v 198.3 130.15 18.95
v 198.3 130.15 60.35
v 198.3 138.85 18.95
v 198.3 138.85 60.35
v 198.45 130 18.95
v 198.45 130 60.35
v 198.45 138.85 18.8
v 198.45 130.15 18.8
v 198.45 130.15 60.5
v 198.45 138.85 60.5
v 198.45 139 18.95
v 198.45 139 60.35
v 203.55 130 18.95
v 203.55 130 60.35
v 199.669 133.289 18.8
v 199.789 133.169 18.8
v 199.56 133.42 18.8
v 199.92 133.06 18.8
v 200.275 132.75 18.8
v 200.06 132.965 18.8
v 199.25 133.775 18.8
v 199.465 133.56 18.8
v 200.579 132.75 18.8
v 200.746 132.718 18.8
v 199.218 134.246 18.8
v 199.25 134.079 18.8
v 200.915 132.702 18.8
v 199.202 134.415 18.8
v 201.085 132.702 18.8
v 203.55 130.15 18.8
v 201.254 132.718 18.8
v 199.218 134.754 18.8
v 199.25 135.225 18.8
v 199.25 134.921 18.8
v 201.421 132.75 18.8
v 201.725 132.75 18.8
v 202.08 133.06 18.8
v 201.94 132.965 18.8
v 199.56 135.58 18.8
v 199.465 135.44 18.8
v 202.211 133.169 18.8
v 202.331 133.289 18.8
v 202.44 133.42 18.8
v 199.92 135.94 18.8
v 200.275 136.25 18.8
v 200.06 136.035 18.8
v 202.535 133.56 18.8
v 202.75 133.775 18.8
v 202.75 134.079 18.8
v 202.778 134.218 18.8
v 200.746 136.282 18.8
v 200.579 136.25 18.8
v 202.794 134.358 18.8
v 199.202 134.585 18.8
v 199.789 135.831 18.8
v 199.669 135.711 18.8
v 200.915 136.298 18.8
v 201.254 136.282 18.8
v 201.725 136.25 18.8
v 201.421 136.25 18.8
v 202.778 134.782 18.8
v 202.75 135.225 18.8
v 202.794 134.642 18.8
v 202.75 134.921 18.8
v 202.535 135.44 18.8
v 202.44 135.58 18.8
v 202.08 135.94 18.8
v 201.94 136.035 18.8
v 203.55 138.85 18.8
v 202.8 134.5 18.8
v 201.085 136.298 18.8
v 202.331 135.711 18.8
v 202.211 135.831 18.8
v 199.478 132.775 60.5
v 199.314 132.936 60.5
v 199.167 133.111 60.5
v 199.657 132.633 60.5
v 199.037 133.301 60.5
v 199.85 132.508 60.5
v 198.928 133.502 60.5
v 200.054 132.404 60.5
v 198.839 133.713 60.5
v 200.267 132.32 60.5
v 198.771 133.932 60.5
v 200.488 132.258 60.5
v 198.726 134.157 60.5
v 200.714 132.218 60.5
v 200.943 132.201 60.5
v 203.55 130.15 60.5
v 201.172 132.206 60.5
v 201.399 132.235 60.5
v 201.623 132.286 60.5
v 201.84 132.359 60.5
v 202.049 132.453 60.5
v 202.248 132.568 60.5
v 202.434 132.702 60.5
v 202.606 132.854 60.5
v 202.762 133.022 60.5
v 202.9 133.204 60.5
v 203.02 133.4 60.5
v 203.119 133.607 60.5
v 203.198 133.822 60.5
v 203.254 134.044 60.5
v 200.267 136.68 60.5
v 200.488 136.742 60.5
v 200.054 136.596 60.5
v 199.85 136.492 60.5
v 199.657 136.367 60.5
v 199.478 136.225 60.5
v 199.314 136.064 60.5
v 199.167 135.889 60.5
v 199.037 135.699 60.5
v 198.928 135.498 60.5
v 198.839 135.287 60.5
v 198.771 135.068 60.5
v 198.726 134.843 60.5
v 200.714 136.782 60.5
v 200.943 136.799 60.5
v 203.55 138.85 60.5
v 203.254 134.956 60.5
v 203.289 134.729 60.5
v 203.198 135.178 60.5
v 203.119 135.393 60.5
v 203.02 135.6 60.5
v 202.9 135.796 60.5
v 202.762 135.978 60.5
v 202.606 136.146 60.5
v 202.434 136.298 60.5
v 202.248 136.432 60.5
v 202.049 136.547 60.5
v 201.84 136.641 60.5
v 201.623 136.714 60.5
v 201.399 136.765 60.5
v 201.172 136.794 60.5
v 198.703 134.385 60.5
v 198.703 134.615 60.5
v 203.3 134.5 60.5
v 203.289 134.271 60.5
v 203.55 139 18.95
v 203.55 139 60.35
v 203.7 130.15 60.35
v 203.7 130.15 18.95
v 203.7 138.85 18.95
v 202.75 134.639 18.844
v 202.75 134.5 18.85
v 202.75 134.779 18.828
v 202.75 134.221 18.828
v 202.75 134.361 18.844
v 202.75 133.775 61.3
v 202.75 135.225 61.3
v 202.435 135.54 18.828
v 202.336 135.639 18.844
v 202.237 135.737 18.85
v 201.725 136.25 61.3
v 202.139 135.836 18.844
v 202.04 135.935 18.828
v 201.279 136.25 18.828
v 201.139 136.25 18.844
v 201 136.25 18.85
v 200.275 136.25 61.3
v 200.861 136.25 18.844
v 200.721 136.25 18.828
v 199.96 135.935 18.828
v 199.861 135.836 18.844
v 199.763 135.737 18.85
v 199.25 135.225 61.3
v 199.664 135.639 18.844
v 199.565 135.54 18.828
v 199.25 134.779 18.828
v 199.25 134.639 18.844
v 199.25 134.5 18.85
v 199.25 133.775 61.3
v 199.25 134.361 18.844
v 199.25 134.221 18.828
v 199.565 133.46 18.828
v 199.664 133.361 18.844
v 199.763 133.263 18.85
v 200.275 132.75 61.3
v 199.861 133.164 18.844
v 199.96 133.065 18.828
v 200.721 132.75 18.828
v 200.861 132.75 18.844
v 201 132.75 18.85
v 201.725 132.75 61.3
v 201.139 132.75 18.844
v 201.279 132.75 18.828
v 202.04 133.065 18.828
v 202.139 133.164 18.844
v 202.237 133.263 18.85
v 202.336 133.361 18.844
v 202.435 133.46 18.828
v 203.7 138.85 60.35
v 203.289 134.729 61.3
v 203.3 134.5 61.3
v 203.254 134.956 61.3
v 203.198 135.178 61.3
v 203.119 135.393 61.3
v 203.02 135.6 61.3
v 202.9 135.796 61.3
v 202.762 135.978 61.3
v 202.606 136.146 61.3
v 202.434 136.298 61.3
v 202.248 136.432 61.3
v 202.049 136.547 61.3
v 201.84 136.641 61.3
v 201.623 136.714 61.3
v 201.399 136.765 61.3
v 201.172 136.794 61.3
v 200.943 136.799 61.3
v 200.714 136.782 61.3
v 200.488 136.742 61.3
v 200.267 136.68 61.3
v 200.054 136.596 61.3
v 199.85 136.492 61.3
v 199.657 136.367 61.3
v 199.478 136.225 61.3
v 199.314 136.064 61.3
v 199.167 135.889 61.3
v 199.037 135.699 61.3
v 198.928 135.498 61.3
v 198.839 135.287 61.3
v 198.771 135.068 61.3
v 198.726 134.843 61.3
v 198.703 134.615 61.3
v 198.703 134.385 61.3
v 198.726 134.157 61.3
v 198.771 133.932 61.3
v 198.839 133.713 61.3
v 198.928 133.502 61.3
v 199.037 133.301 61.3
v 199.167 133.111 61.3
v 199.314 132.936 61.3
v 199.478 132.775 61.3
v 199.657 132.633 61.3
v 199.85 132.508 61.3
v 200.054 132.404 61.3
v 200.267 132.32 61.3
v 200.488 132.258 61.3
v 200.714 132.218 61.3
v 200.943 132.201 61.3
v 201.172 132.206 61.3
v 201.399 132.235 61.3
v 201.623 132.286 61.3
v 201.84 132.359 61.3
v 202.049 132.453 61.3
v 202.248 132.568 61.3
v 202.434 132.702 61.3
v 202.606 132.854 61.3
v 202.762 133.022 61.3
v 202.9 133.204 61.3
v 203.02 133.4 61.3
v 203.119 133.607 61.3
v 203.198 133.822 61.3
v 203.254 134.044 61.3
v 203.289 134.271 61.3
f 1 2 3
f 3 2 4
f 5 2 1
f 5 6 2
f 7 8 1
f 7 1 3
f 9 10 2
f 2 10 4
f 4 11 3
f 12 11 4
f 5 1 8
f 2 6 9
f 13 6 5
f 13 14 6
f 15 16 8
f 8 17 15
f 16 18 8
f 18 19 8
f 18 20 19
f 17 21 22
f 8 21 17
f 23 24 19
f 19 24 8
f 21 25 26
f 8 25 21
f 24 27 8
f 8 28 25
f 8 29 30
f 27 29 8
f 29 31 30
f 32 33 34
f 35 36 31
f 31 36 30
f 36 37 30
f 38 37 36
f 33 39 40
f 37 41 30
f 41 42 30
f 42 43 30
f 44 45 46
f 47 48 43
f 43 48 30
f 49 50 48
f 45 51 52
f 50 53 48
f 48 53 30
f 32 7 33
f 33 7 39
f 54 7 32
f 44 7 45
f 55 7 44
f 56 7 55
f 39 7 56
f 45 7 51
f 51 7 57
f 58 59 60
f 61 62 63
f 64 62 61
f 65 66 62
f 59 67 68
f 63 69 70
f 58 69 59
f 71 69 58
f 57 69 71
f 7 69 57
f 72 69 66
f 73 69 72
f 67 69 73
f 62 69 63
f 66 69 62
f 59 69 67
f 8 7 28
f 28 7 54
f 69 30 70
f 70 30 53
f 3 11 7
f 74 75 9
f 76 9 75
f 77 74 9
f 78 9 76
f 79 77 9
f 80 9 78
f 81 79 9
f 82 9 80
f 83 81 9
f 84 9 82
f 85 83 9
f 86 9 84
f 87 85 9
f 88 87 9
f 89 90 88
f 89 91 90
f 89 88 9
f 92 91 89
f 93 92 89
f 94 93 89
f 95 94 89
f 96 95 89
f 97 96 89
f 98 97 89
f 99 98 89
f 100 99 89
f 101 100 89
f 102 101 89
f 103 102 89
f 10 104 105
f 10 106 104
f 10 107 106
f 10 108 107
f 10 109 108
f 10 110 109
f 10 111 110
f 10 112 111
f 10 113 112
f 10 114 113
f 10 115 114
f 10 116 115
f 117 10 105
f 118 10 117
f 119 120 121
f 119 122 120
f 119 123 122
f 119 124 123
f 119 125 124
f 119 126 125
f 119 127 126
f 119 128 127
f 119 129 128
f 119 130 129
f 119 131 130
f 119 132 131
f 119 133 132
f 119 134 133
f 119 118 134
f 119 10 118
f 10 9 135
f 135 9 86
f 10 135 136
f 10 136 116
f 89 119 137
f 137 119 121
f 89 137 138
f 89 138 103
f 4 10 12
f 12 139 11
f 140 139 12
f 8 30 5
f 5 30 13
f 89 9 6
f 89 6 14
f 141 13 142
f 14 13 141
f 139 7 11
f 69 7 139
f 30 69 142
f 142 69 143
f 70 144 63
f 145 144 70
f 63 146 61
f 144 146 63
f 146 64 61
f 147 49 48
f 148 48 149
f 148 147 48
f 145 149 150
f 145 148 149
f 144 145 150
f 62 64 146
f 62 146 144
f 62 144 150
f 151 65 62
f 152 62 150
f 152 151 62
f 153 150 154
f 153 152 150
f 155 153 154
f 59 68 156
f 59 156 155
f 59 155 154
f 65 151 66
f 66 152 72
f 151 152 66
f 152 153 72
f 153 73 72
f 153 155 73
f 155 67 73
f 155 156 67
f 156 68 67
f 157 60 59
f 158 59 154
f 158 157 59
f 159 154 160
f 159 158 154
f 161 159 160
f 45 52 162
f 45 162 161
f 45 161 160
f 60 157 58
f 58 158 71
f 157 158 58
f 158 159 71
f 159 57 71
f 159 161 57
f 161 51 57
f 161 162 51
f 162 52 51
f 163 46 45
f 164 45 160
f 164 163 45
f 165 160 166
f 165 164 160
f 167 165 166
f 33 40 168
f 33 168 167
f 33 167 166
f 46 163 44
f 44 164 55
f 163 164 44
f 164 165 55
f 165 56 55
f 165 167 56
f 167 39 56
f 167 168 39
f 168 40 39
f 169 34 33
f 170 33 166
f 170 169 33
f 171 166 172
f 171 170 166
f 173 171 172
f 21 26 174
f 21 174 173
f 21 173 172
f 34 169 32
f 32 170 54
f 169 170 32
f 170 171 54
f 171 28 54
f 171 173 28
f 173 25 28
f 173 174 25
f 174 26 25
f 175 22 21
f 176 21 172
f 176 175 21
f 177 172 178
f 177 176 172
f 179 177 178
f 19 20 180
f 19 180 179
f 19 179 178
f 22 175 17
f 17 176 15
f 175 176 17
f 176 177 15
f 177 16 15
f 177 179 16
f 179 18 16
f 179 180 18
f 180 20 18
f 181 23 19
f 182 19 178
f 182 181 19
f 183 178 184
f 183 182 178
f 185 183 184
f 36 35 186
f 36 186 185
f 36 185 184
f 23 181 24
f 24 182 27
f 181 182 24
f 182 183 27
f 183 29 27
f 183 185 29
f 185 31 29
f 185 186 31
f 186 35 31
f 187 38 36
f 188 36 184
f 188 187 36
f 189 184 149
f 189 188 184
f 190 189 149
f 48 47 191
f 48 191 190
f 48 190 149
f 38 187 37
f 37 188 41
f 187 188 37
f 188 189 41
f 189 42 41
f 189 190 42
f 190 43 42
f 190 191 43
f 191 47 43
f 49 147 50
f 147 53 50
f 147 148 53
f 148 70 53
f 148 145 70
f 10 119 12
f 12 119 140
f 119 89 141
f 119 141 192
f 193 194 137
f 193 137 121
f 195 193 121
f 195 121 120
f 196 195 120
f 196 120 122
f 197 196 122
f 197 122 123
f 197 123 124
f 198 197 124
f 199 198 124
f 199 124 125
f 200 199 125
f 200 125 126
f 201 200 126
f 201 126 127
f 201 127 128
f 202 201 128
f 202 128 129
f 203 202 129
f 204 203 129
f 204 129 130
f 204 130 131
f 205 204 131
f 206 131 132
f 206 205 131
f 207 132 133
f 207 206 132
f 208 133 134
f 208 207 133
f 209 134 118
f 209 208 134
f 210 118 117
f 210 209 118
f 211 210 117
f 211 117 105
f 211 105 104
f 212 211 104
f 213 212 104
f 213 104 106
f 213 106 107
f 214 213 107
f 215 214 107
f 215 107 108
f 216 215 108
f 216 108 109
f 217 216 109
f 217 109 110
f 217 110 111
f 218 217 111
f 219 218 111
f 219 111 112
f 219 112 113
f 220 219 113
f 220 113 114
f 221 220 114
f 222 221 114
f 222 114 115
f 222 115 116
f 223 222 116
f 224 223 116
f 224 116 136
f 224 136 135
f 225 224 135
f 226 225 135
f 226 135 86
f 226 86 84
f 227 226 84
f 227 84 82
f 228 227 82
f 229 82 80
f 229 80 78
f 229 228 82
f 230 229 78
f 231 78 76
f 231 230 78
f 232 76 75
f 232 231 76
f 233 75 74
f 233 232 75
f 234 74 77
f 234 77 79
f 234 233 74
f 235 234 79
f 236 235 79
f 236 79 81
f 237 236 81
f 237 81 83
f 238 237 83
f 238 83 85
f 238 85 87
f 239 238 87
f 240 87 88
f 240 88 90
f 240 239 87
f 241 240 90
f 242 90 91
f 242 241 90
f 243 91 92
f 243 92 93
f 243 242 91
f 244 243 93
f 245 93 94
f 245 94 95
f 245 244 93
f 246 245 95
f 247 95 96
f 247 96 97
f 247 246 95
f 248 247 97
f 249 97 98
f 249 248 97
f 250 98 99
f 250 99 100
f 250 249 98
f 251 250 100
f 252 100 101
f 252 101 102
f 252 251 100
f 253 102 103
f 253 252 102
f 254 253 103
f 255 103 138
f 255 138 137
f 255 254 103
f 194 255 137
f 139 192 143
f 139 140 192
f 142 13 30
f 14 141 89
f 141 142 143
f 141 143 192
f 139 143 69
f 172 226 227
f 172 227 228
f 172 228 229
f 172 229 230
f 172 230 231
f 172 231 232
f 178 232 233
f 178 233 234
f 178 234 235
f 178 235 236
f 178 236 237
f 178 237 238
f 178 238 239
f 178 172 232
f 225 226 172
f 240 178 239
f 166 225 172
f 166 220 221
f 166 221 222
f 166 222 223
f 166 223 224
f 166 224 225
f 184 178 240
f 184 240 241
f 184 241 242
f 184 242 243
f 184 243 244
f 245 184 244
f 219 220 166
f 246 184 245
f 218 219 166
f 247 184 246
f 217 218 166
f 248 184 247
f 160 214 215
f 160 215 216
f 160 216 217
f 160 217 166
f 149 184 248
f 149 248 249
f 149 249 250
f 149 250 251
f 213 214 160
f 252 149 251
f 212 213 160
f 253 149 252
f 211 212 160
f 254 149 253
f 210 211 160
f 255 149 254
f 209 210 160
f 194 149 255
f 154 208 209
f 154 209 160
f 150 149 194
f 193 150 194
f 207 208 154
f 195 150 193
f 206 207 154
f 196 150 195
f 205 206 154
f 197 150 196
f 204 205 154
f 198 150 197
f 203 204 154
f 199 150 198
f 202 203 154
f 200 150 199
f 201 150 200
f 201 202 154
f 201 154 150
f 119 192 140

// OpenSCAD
// Generated by the canonical parent Python sources and validated exchange pipeline.
polyhedron(points=[[198.3000030517578, 130.14999389648438, 18.950000762939453], [198.3000030517578, 130.14999389648438, 60.349998474121094], [198.3000030517578, 138.85000610351562, 18.950000762939453], [198.3000030517578, 138.85000610351562, 60.349998474121094], [198.4499969482422, 130.0, 18.950000762939453], [198.4499969482422, 130.0, 60.349998474121094], [198.4499969482422, 138.85000610351562, 18.799999237060547], [198.4499969482422, 130.14999389648438, 18.799999237060547], [198.4499969482422, 130.14999389648438, 60.5], [198.4499969482422, 138.85000610351562, 60.5], [198.4499969482422, 139.0, 18.950000762939453], [198.4499969482422, 139.0, 60.349998474121094], [203.5500030517578, 130.0, 18.950000762939453], [203.5500030517578, 130.0, 60.349998474121094], [199.66851806640625, 133.2887420654297, 18.799999237060547], [199.7887420654297, 133.16851806640625, 18.799999237060547], [199.56016540527344, 133.41978454589844, 18.799999237060547], [199.91978454589844, 133.06016540527344, 18.799999237060547], [200.27513122558594, 132.75, 18.799999237060547], [200.0604705810547, 132.96466064453125, 18.799999237060547], [199.25, 133.77513122558594, 18.799999237060547], [199.46466064453125, 133.5604705810547, 18.799999237060547], [200.5786895751953, 132.75, 18.799999237060547], [200.74569702148438, 132.71804809570312, 18.799999237060547], [199.21804809570312, 134.24569702148438, 18.799999237060547], [199.25, 134.0786895751953, 18.799999237060547], [200.91497802734375, 132.70201110839844, 18.799999237060547], [199.20201110839844, 134.41497802734375, 18.799999237060547], [201.08502197265625, 132.70201110839844, 18.799999237060547], [203.5500030517578, 130.14999389648438, 18.799999237060547], [201.25430297851562, 132.71804809570312, 18.799999237060547], [199.21804809570312, 134.75430297851562, 18.799999237060547], [199.25, 135.22486877441406, 18.799999237060547], [199.25, 134.9213104248047, 18.799999237060547], [201.4213104248047, 132.75, 18.799999237060547], [201.72486877441406, 132.75, 18.799999237060547], [202.08021545410156, 133.06016540527344, 18.799999237060547], [201.9395294189453, 132.96466064453125, 18.799999237060547], [199.56016540527344, 135.58021545410156, 18.799999237060547], [199.46466064453125, 135.4395294189453, 18.799999237060547], [202.2112579345703, 133.16851806640625, 18.799999237060547], [202.33148193359375, 133.2887420654297, 18.799999237060547], [202.43983459472656, 133.41978454589844, 18.799999237060547], [199.91978454589844, 135.93983459472656, 18.799999237060547], [200.27513122558594, 136.25, 18.799999237060547], [200.0604705810547, 136.03533935546875, 18.799999237060547], [202.53533935546875, 133.5604705810547, 18.799999237060547], [202.75, 133.77513122558594, 18.799999237060547], [202.75, 134.0786895751953, 18.799999237060547], [202.77772521972656, 134.21766662597656, 18.799999237060547], [200.74569702148438, 136.28195190429688, 18.799999237060547], [200.5786895751953, 136.25, 18.799999237060547], [202.79441833496094, 134.3583984375, 18.799999237060547], [199.20201110839844, 134.58502197265625, 18.799999237060547], [199.7887420654297, 135.83148193359375, 18.799999237060547], [199.66851806640625, 135.7112579345703, 18.799999237060547], [200.91497802734375, 136.29798889160156, 18.799999237060547], [201.25430297851562, 136.28195190429688, 18.799999237060547], [201.72486877441406, 136.25, 18.799999237060547], [201.4213104248047, 136.25, 18.799999237060547], [202.77772521972656, 134.78233337402344, 18.799999237060547], [202.75, 135.22486877441406, 18.799999237060547], [202.79441833496094, 134.6416015625, 18.799999237060547], [202.75, 134.9213104248047, 18.799999237060547], [202.53533935546875, 135.4395294189453, 18.799999237060547], [202.43983459472656, 135.58021545410156, 18.799999237060547], [202.08021545410156, 135.93983459472656, 18.799999237060547], [201.9395294189453, 136.03533935546875, 18.799999237060547], [203.5500030517578, 138.85000610351562, 18.799999237060547], [202.8000030517578, 134.5, 18.799999237060547], [201.08502197265625, 136.29798889160156, 18.799999237060547], [202.33148193359375, 135.7112579345703, 18.799999237060547], [202.2112579345703, 135.83148193359375, 18.799999237060547], [199.47811889648438, 132.77549743652344, 60.5], [199.31398010253906, 132.93560791015625, 60.5], [199.16659545898438, 133.1112518310547, 60.5], [199.6573944091797, 132.63253784179688, 60.5], [199.0374298095703, 133.3007049560547, 60.5], [199.85000610351562, 132.50814819335938, 60.5], [198.92776489257812, 133.50205993652344, 60.5], [200.05404663085938, 132.40353393554688, 60.5], [198.83871459960938, 133.71334838867188, 60.5], [200.26748657226562, 132.31976318359375, 60.5], [198.7711181640625, 133.93246459960938, 60.5], [200.4882049560547, 132.25765991210938, 60.5], [198.72569274902344, 134.15719604492188, 60.5], [200.71400451660156, 132.2178497314453, 60.5], [200.94265747070312, 132.20071411132812, 60.5], [203.5500030517578, 130.14999389648438, 60.5], [201.171875, 132.20643615722656, 60.5], [201.39938354492188, 132.2349395751953, 60.5], [201.62294006347656, 132.2859649658203, 60.5], [201.8402862548828, 132.35899353027344, 60.5], [202.04928588867188, 132.4532928466797, 60.5], [202.24786376953125, 132.5679473876953, 60.5], [202.43402099609375, 132.7017822265625, 60.5], [202.60594177246094, 132.85350036621094, 60.5], [202.76190185546875, 133.02159118652344, 60.5], [202.9003448486328, 133.20436096191406, 60.5], [203.01991271972656, 133.40000915527344, 60.5], [203.11940002441406, 133.60659790039062, 60.5], [203.19781494140625, 133.8220672607422, 60.5], [203.25439453125, 134.0442657470703, 60.5], [200.26748657226562, 136.68023681640625, 60.5], [200.4882049560547, 136.74234008789062, 60.5], [200.05404663085938, 136.59646606445312, 60.5], [199.85000610351562, 136.49185180664062, 60.5], [199.6573944091797, 136.36746215820312, 60.5], [199.47811889648438, 136.22450256347656, 60.5], [199.31398010253906, 136.06439208984375, 60.5], [199.16659545898438, 135.8887481689453, 60.5], [199.0374298095703, 135.6992950439453, 60.5], [198.92776489257812, 135.49794006347656, 60.5], [198.83871459960938, 135.28665161132812, 60.5], [198.7711181640625, 135.06753540039062, 60.5], [198.72569274902344, 134.84280395507812, 60.5], [200.71400451660156, 136.7821502685547, 60.5], [200.94265747070312, 136.79928588867188, 60.5], [203.5500030517578, 138.85000610351562, 60.5], [203.25439453125, 134.9557342529297, 60.5], [203.28857421875, 134.72900390625, 60.5], [203.19781494140625, 135.1779327392578, 60.5], [203.11940002441406, 135.39340209960938, 60.5], [203.01991271972656, 135.59999084472656, 60.5], [202.9003448486328, 135.79563903808594, 60.5], [202.76190185546875, 135.97840881347656, 60.5], [202.60594177246094, 136.14649963378906, 60.5], [202.43402099609375, 136.2982177734375, 60.5], [202.24786376953125, 136.4320526123047, 60.5], [202.04928588867188, 136.5467071533203, 60.5], [201.8402862548828, 136.64100646972656, 60.5], [201.62294006347656, 136.7140350341797, 60.5], [201.39938354492188, 136.7650604248047, 60.5], [201.171875, 136.79356384277344, 60.5], [198.70286560058594, 134.38536071777344, 60.5], [198.70286560058594, 134.61463928222656, 60.5], [203.3000030517578, 134.5, 60.5], [203.28857421875, 134.27099609375, 60.5], [203.5500030517578, 139.0, 18.950000762939453], [203.5500030517578, 139.0, 60.349998474121094], [203.6999969482422, 130.14999389648438, 60.349998474121094], [203.6999969482422, 130.14999389648438, 18.950000762939453], [203.6999969482422, 138.85000610351562, 18.950000762939453], [202.75, 134.63926696777344, 18.844467163085938], [202.75, 134.5, 18.850000381469727], [202.75, 134.77940368652344, 18.827836990356445], [202.75, 134.22059631347656, 18.827836990356445], [202.75, 134.36073303222656, 18.844467163085938], [202.75, 133.77513122558594, 61.29999923706055], [202.75, 135.22486877441406, 61.29999923706055], [202.43499755859375, 135.5398712158203, 18.827836990356445], [202.33590698242188, 135.6389617919922, 18.844467163085938], [202.23744201660156, 135.73744201660156, 18.850000381469727], [201.72486877441406, 136.25, 61.29999923706055], [202.1389617919922, 135.83590698242188, 18.844467163085938], [202.0398712158203, 135.93499755859375, 18.827836990356445], [201.27940368652344, 136.25, 18.827836990356445], [201.13926696777344, 136.25, 18.844467163085938], [201.0, 136.25, 18.850000381469727], [200.27513122558594, 136.25, 61.29999923706055], [200.86073303222656, 136.25, 18.844467163085938], [200.72059631347656, 136.25, 18.827836990356445], [199.9601287841797, 135.93499755859375, 18.827836990356445], [199.8610382080078, 135.83590698242188, 18.844467163085938], [199.76255798339844, 135.73744201660156, 18.850000381469727], [199.25, 135.22486877441406, 61.29999923706055], [199.66409301757812, 135.6389617919922, 18.844467163085938], [199.56500244140625, 135.5398712158203, 18.827836990356445], [199.25, 134.77940368652344, 18.827836990356445], [199.25, 134.63926696777344, 18.844467163085938], [199.25, 134.5, 18.850000381469727], [199.25, 133.77513122558594, 61.29999923706055], [199.25, 134.36073303222656, 18.844467163085938], [199.25, 134.22059631347656, 18.827836990356445], [199.56500244140625, 133.4601287841797, 18.827836990356445], [199.66409301757812, 133.3610382080078, 18.844467163085938], [199.76255798339844, 133.26255798339844, 18.850000381469727], [200.27513122558594, 132.75, 61.29999923706055], [199.8610382080078, 133.16409301757812, 18.844467163085938], [199.9601287841797, 133.06500244140625, 18.827836990356445], [200.72059631347656, 132.75, 18.827836990356445], [200.86073303222656, 132.75, 18.844467163085938], [201.0, 132.75, 18.850000381469727], [201.72486877441406, 132.75, 61.29999923706055], [201.13926696777344, 132.75, 18.844467163085938], [201.27940368652344, 132.75, 18.827836990356445], [202.0398712158203, 133.06500244140625, 18.827836990356445], [202.1389617919922, 133.16409301757812, 18.844467163085938], [202.23744201660156, 133.26255798339844, 18.850000381469727], [202.33590698242188, 133.3610382080078, 18.844467163085938], [202.43499755859375, 133.4601287841797, 18.827836990356445], [203.6999969482422, 138.85000610351562, 60.349998474121094], [203.28857421875, 134.72900390625, 61.29999923706055], [203.3000030517578, 134.5, 61.29999923706055], [203.25439453125, 134.9557342529297, 61.29999923706055], [203.19781494140625, 135.1779327392578, 61.29999923706055], [203.11940002441406, 135.39340209960938, 61.29999923706055], [203.01991271972656, 135.59999084472656, 61.29999923706055], [202.9003448486328, 135.79563903808594, 61.29999923706055], [202.76190185546875, 135.97840881347656, 61.29999923706055], [202.60594177246094, 136.14649963378906, 61.29999923706055], [202.43402099609375, 136.2982177734375, 61.29999923706055], [202.24786376953125, 136.4320526123047, 61.29999923706055], [202.04928588867188, 136.5467071533203, 61.29999923706055], [201.8402862548828, 136.64100646972656, 61.29999923706055], [201.62294006347656, 136.7140350341797, 61.29999923706055], [201.39938354492188, 136.7650604248047, 61.29999923706055], [201.171875, 136.79356384277344, 61.29999923706055], [200.94265747070312, 136.79928588867188, 61.29999923706055], [200.71400451660156, 136.7821502685547, 61.29999923706055], [200.4882049560547, 136.74234008789062, 61.29999923706055], [200.26748657226562, 136.68023681640625, 61.29999923706055], [200.05404663085938, 136.59646606445312, 61.29999923706055], [199.85000610351562, 136.49185180664062, 61.29999923706055], [199.6573944091797, 136.36746215820312, 61.29999923706055], [199.47811889648438, 136.22450256347656, 61.29999923706055], [199.31398010253906, 136.06439208984375, 61.29999923706055], [199.16659545898438, 135.8887481689453, 61.29999923706055], [199.0374298095703, 135.6992950439453, 61.29999923706055], [198.92776489257812, 135.49794006347656, 61.29999923706055], [198.83871459960938, 135.28665161132812, 61.29999923706055], [198.7711181640625, 135.06753540039062, 61.29999923706055], [198.72569274902344, 134.84280395507812, 61.29999923706055], [198.70286560058594, 134.61463928222656, 61.29999923706055], [198.70286560058594, 134.38536071777344, 61.29999923706055], [198.72569274902344, 134.15719604492188, 61.29999923706055], [198.7711181640625, 133.93246459960938, 61.29999923706055], [198.83871459960938, 133.71334838867188, 61.29999923706055], [198.92776489257812, 133.50205993652344, 61.29999923706055], [199.0374298095703, 133.3007049560547, 61.29999923706055], [199.16659545898438, 133.1112518310547, 61.29999923706055], [199.31398010253906, 132.93560791015625, 61.29999923706055], [199.47811889648438, 132.77549743652344, 61.29999923706055], [199.6573944091797, 132.63253784179688, 61.29999923706055], [199.85000610351562, 132.50814819335938, 61.29999923706055], [200.05404663085938, 132.40353393554688, 61.29999923706055], [200.26748657226562, 132.31976318359375, 61.29999923706055], [200.4882049560547, 132.25765991210938, 61.29999923706055], [200.71400451660156, 132.2178497314453, 61.29999923706055], [200.94265747070312, 132.20071411132812, 61.29999923706055], [201.171875, 132.20643615722656, 61.29999923706055], [201.39938354492188, 132.2349395751953, 61.29999923706055], [201.62294006347656, 132.2859649658203, 61.29999923706055], [201.8402862548828, 132.35899353027344, 61.29999923706055], [202.04928588867188, 132.4532928466797, 61.29999923706055], [202.24786376953125, 132.5679473876953, 61.29999923706055], [202.43402099609375, 132.7017822265625, 61.29999923706055], [202.60594177246094, 132.85350036621094, 61.29999923706055], [202.76190185546875, 133.02159118652344, 61.29999923706055], [202.9003448486328, 133.20436096191406, 61.29999923706055], [203.01991271972656, 133.40000915527344, 61.29999923706055], [203.11940002441406, 133.60659790039062, 61.29999923706055], [203.19781494140625, 133.8220672607422, 61.29999923706055], [203.25439453125, 134.0442657470703, 61.29999923706055], [203.28857421875, 134.27099609375, 61.29999923706055]],faces=[[2, 1, 0], [3, 1, 2], [0, 1, 4], [1, 5, 4], [0, 7, 6], [2, 0, 6], [1, 9, 8], [3, 9, 1], [2, 10, 3], [3, 10, 11], [7, 0, 4], [8, 5, 1], [4, 5, 12], [5, 13, 12], [7, 15, 14], [14, 16, 7], [7, 17, 15], [7, 18, 17], [18, 19, 17], [21, 20, 16], [16, 20, 7], [18, 23, 22], [7, 23, 18], [25, 24, 20], [20, 24, 7], [7, 26, 23], [24, 27, 7], [29, 28, 7], [7, 28, 26], [29, 30, 28], [33, 32, 31], [30, 35, 34], [29, 35, 30], [29, 36, 35], [35, 36, 37], [39, 38, 32], [29, 40, 36], [29, 41, 40], [29, 42, 41], [45, 44, 43], [42, 47, 46], [29, 47, 42], [47, 49, 48], [51, 50, 44], [47, 52, 49], [29, 52, 47], [32, 6, 31], [38, 6, 32], [31, 6, 53], [44, 6, 43], [43, 6, 54], [54, 6, 55], [55, 6, 38], [50, 6, 44], [56, 6, 50], [59, 58, 57], [62, 61, 60], [60, 61, 63], [61, 65, 64], [67, 66, 58], [69, 68, 62], [58, 68, 57], [57, 68, 70], [70, 68, 56], [56, 68, 6], [65, 68, 71], [71, 68, 72], [72, 68, 66], [62, 68, 61], [61, 68, 65], [66, 68, 58], [27, 6, 7], [53, 6, 27], [69, 29, 68], [52, 29, 69], [6, 10, 2], [8, 74, 73], [74, 8, 75], [8, 73, 76], [75, 8, 77], [8, 76, 78], [77, 8, 79], [8, 78, 80], [79, 8, 81], [8, 80, 82], [81, 8, 83], [8, 82, 84], [83, 8, 85], [8, 84, 86], [8, 86, 87], [87, 89, 88], [89, 90, 88], [8, 87, 88], [88, 90, 91], [88, 91, 92], [88, 92, 93], [88, 93, 94], [88, 94, 95], [88, 95, 96], [88, 96, 97], [88, 97, 98], [88, 98, 99], [88, 99, 100], [88, 100, 101], [88, 101, 102], [104, 103, 9], [103, 105, 9], [105, 106, 9], [106, 107, 9], [107, 108, 9], [108, 109, 9], [109, 110, 9], [110, 111, 9], [111, 112, 9], [112, 113, 9], [113, 114, 9], [114, 115, 9], [104, 9, 116], [116, 9, 117], [120, 119, 118], [119, 121, 118], [121, 122, 118], [122, 123, 118], [123, 124, 118], [124, 125, 118], [125, 126, 118], [126, 127, 118], [127, 128, 118], [128, 129, 118], [129, 130, 118], [130, 131, 118], [131, 132, 118], [132, 133, 118], [133, 117, 118], [117, 9, 118], [134, 8, 9], [85, 8, 134], [135, 134, 9], [115, 135, 9], [136, 118, 88], [120, 118, 136], [137, 136, 88], [102, 137, 88], [11, 9, 3], [10, 138, 11], [11, 138, 139], [4, 29, 7], [12, 29, 4], [5, 8, 88], [13, 5, 88], [141, 12, 140], [140, 12, 13], [10, 6, 138], [138, 6, 68], [141, 68, 29], [142, 68, 141], [62, 143, 69], [69, 143, 144], [60, 145, 62], [62, 145, 143], [60, 63, 145], [47, 48, 146], [148, 47, 147], [47, 146, 147], [149, 148, 144], [148, 147, 144], [149, 144, 143], [145, 63, 61], [143, 145, 61], [149, 143, 61], [61, 64, 150], [149, 61, 151], [61, 150, 151], [153, 149, 152], [149, 151, 152], [153, 152, 154], [155, 67, 58], [154, 155, 58], [153, 154, 58], [65, 150, 64], [71, 151, 65], [65, 151, 150], [71, 152, 151], [71, 72, 152], [72, 154, 152], [72, 66, 154], [66, 155, 154], [66, 67, 155], [58, 59, 156], [153, 58, 157], [58, 156, 157], [159, 153, 158], [153, 157, 158], [159, 158, 160], [161, 51, 44], [160, 161, 44], [159, 160, 44], [57, 156, 59], [70, 157, 57], [57, 157, 156], [70, 158, 157], [70, 56, 158], [56, 160, 158], [56, 50, 160], [50, 161, 160], [50, 51, 161], [44, 45, 162], [159, 44, 163], [44, 162, 163], [165, 159, 164], [159, 163, 164], [165, 164, 166], [167, 39, 32], [166, 167, 32], [165, 166, 32], [43, 162, 45], [54, 163, 43], [43, 163, 162], [54, 164, 163], [54, 55, 164], [55, 166, 164], [55, 38, 166], [38, 167, 166], [38, 39, 167], [32, 33, 168], [165, 32, 169], [32, 168, 169], [171, 165, 170], [165, 169, 170], [171, 170, 172], [173, 25, 20], [172, 173, 20], [171, 172, 20], [31, 168, 33], [53, 169, 31], [31, 169, 168], [53, 170, 169], [53, 27, 170], [27, 172, 170], [27, 24, 172], [24, 173, 172], [24, 25, 173], [20, 21, 174], [171, 20, 175], [20, 174, 175], [177, 171, 176], [171, 175, 176], [177, 176, 178], [179, 19, 18], [178, 179, 18], [177, 178, 18], [16, 174, 21], [14, 175, 16], [16, 175, 174], [14, 176, 175], [14, 15, 176], [15, 178, 176], [15, 17, 178], [17, 179, 178], [17, 19, 179], [18, 22, 180], [177, 18, 181], [18, 180, 181], [183, 177, 182], [177, 181, 182], [183, 182, 184], [185, 34, 35], [184, 185, 35], [183, 184, 35], [23, 180, 22], [26, 181, 23], [23, 181, 180], [26, 182, 181], [26, 28, 182], [28, 184, 182], [28, 30, 184], [30, 185, 184], [30, 34, 185], [35, 37, 186], [183, 35, 187], [35, 186, 187], [148, 183, 188], [183, 187, 188], [148, 188, 189], [190, 46, 47], [189, 190, 47], [148, 189, 47], [36, 186, 37], [40, 187, 36], [36, 187, 186], [40, 188, 187], [40, 41, 188], [41, 189, 188], [41, 42, 189], [42, 190, 189], [42, 46, 190], [49, 146, 48], [49, 52, 146], [52, 147, 146], [52, 69, 147], [69, 144, 147], [11, 118, 9], [139, 118, 11], [140, 88, 118], [191, 140, 118], [136, 193, 192], [120, 136, 192], [120, 192, 194], [119, 120, 194], [119, 194, 195], [121, 119, 195], [121, 195, 196], [122, 121, 196], [123, 122, 196], [123, 196, 197], [123, 197, 198], [124, 123, 198], [124, 198, 199], [125, 124, 199], [125, 199, 200], [126, 125, 200], [127, 126, 200], [127, 200, 201], [128, 127, 201], [128, 201, 202], [128, 202, 203], [129, 128, 203], [130, 129, 203], [130, 203, 204], [131, 130, 205], [130, 204, 205], [132, 131, 206], [131, 205, 206], [133, 132, 207], [132, 206, 207], [117, 133, 208], [133, 207, 208], [116, 117, 209], [117, 208, 209], [116, 209, 210], [104, 116, 210], [103, 104, 210], [103, 210, 211], [103, 211, 212], [105, 103, 212], [106, 105, 212], [106, 212, 213], [106, 213, 214], [107, 106, 214], [107, 214, 215], [108, 107, 215], [108, 215, 216], [109, 108, 216], [110, 109, 216], [110, 216, 217], [110, 217, 218], [111, 110, 218], [112, 111, 218], [112, 218, 219], [113, 112, 219], [113, 219, 220], [113, 220, 221], [114, 113, 221], [115, 114, 221], [115, 221, 222], [115, 222, 223], [135, 115, 223], [134, 135, 223], [134, 223, 224], [134, 224, 225], [85, 134, 225], [83, 85, 225], [83, 225, 226], [81, 83, 226], [81, 226, 227], [79, 81, 228], [77, 79, 228], [81, 227, 228], [77, 228, 229], [75, 77, 230], [77, 229, 230], [74, 75, 231], [75, 230, 231], [73, 74, 232], [74, 231, 232], [76, 73, 233], [78, 76, 233], [73, 232, 233], [78, 233, 234], [78, 234, 235], [80, 78, 235], [80, 235, 236], [82, 80, 236], [82, 236, 237], [84, 82, 237], [86, 84, 237], [86, 237, 238], [87, 86, 239], [89, 87, 239], [86, 238, 239], [89, 239, 240], [90, 89, 241], [89, 240, 241], [91, 90, 242], [92, 91, 242], [90, 241, 242], [92, 242, 243], [93, 92, 244], [94, 93, 244], [92, 243, 244], [94, 244, 245], [95, 94, 246], [96, 95, 246], [94, 245, 246], [96, 246, 247], [97, 96, 248], [96, 247, 248], [98, 97, 249], [99, 98, 249], [97, 248, 249], [99, 249, 250], [100, 99, 251], [101, 100, 251], [99, 250, 251], [102, 101, 252], [101, 251, 252], [102, 252, 253], [137, 102, 254], [136, 137, 254], [102, 253, 254], [136, 254, 193], [142, 191, 138], [191, 139, 138], [29, 12, 141], [88, 140, 13], [142, 141, 140], [191, 142, 140], [68, 142, 138], [226, 225, 171], [227, 226, 171], [228, 227, 171], [229, 228, 171], [230, 229, 171], [231, 230, 171], [232, 231, 177], [233, 232, 177], [234, 233, 177], [235, 234, 177], [236, 235, 177], [237, 236, 177], [238, 237, 177], [231, 171, 177], [171, 225, 224], [238, 177, 239], [171, 224, 165], [220, 219, 165], [221, 220, 165], [222, 221, 165], [223, 222, 165], [224, 223, 165], [239, 177, 183], [240, 239, 183], [241, 240, 183], [242, 241, 183], [243, 242, 183], [243, 183, 244], [165, 219, 218], [244, 183, 245], [165, 218, 217], [245, 183, 246], [165, 217, 216], [246, 183, 247], [214, 213, 159], [215, 214, 159], [216, 215, 159], [165, 216, 159], [247, 183, 148], [248, 247, 148], [249, 248, 148], [250, 249, 148], [159, 213, 212], [250, 148, 251], [159, 212, 211], [251, 148, 252], [159, 211, 210], [252, 148, 253], [159, 210, 209], [253, 148, 254], [159, 209, 208], [254, 148, 193], [208, 207, 153], [159, 208, 153], [193, 148, 149], [193, 149, 192], [153, 207, 206], [192, 149, 194], [153, 206, 205], [194, 149, 195], [153, 205, 204], [195, 149, 196], [153, 204, 203], [196, 149, 197], [153, 203, 202], [197, 149, 198], [153, 202, 201], [198, 149, 199], [199, 149, 200], [153, 201, 200], [149, 153, 200], [139, 191, 118]],convexity=10);
